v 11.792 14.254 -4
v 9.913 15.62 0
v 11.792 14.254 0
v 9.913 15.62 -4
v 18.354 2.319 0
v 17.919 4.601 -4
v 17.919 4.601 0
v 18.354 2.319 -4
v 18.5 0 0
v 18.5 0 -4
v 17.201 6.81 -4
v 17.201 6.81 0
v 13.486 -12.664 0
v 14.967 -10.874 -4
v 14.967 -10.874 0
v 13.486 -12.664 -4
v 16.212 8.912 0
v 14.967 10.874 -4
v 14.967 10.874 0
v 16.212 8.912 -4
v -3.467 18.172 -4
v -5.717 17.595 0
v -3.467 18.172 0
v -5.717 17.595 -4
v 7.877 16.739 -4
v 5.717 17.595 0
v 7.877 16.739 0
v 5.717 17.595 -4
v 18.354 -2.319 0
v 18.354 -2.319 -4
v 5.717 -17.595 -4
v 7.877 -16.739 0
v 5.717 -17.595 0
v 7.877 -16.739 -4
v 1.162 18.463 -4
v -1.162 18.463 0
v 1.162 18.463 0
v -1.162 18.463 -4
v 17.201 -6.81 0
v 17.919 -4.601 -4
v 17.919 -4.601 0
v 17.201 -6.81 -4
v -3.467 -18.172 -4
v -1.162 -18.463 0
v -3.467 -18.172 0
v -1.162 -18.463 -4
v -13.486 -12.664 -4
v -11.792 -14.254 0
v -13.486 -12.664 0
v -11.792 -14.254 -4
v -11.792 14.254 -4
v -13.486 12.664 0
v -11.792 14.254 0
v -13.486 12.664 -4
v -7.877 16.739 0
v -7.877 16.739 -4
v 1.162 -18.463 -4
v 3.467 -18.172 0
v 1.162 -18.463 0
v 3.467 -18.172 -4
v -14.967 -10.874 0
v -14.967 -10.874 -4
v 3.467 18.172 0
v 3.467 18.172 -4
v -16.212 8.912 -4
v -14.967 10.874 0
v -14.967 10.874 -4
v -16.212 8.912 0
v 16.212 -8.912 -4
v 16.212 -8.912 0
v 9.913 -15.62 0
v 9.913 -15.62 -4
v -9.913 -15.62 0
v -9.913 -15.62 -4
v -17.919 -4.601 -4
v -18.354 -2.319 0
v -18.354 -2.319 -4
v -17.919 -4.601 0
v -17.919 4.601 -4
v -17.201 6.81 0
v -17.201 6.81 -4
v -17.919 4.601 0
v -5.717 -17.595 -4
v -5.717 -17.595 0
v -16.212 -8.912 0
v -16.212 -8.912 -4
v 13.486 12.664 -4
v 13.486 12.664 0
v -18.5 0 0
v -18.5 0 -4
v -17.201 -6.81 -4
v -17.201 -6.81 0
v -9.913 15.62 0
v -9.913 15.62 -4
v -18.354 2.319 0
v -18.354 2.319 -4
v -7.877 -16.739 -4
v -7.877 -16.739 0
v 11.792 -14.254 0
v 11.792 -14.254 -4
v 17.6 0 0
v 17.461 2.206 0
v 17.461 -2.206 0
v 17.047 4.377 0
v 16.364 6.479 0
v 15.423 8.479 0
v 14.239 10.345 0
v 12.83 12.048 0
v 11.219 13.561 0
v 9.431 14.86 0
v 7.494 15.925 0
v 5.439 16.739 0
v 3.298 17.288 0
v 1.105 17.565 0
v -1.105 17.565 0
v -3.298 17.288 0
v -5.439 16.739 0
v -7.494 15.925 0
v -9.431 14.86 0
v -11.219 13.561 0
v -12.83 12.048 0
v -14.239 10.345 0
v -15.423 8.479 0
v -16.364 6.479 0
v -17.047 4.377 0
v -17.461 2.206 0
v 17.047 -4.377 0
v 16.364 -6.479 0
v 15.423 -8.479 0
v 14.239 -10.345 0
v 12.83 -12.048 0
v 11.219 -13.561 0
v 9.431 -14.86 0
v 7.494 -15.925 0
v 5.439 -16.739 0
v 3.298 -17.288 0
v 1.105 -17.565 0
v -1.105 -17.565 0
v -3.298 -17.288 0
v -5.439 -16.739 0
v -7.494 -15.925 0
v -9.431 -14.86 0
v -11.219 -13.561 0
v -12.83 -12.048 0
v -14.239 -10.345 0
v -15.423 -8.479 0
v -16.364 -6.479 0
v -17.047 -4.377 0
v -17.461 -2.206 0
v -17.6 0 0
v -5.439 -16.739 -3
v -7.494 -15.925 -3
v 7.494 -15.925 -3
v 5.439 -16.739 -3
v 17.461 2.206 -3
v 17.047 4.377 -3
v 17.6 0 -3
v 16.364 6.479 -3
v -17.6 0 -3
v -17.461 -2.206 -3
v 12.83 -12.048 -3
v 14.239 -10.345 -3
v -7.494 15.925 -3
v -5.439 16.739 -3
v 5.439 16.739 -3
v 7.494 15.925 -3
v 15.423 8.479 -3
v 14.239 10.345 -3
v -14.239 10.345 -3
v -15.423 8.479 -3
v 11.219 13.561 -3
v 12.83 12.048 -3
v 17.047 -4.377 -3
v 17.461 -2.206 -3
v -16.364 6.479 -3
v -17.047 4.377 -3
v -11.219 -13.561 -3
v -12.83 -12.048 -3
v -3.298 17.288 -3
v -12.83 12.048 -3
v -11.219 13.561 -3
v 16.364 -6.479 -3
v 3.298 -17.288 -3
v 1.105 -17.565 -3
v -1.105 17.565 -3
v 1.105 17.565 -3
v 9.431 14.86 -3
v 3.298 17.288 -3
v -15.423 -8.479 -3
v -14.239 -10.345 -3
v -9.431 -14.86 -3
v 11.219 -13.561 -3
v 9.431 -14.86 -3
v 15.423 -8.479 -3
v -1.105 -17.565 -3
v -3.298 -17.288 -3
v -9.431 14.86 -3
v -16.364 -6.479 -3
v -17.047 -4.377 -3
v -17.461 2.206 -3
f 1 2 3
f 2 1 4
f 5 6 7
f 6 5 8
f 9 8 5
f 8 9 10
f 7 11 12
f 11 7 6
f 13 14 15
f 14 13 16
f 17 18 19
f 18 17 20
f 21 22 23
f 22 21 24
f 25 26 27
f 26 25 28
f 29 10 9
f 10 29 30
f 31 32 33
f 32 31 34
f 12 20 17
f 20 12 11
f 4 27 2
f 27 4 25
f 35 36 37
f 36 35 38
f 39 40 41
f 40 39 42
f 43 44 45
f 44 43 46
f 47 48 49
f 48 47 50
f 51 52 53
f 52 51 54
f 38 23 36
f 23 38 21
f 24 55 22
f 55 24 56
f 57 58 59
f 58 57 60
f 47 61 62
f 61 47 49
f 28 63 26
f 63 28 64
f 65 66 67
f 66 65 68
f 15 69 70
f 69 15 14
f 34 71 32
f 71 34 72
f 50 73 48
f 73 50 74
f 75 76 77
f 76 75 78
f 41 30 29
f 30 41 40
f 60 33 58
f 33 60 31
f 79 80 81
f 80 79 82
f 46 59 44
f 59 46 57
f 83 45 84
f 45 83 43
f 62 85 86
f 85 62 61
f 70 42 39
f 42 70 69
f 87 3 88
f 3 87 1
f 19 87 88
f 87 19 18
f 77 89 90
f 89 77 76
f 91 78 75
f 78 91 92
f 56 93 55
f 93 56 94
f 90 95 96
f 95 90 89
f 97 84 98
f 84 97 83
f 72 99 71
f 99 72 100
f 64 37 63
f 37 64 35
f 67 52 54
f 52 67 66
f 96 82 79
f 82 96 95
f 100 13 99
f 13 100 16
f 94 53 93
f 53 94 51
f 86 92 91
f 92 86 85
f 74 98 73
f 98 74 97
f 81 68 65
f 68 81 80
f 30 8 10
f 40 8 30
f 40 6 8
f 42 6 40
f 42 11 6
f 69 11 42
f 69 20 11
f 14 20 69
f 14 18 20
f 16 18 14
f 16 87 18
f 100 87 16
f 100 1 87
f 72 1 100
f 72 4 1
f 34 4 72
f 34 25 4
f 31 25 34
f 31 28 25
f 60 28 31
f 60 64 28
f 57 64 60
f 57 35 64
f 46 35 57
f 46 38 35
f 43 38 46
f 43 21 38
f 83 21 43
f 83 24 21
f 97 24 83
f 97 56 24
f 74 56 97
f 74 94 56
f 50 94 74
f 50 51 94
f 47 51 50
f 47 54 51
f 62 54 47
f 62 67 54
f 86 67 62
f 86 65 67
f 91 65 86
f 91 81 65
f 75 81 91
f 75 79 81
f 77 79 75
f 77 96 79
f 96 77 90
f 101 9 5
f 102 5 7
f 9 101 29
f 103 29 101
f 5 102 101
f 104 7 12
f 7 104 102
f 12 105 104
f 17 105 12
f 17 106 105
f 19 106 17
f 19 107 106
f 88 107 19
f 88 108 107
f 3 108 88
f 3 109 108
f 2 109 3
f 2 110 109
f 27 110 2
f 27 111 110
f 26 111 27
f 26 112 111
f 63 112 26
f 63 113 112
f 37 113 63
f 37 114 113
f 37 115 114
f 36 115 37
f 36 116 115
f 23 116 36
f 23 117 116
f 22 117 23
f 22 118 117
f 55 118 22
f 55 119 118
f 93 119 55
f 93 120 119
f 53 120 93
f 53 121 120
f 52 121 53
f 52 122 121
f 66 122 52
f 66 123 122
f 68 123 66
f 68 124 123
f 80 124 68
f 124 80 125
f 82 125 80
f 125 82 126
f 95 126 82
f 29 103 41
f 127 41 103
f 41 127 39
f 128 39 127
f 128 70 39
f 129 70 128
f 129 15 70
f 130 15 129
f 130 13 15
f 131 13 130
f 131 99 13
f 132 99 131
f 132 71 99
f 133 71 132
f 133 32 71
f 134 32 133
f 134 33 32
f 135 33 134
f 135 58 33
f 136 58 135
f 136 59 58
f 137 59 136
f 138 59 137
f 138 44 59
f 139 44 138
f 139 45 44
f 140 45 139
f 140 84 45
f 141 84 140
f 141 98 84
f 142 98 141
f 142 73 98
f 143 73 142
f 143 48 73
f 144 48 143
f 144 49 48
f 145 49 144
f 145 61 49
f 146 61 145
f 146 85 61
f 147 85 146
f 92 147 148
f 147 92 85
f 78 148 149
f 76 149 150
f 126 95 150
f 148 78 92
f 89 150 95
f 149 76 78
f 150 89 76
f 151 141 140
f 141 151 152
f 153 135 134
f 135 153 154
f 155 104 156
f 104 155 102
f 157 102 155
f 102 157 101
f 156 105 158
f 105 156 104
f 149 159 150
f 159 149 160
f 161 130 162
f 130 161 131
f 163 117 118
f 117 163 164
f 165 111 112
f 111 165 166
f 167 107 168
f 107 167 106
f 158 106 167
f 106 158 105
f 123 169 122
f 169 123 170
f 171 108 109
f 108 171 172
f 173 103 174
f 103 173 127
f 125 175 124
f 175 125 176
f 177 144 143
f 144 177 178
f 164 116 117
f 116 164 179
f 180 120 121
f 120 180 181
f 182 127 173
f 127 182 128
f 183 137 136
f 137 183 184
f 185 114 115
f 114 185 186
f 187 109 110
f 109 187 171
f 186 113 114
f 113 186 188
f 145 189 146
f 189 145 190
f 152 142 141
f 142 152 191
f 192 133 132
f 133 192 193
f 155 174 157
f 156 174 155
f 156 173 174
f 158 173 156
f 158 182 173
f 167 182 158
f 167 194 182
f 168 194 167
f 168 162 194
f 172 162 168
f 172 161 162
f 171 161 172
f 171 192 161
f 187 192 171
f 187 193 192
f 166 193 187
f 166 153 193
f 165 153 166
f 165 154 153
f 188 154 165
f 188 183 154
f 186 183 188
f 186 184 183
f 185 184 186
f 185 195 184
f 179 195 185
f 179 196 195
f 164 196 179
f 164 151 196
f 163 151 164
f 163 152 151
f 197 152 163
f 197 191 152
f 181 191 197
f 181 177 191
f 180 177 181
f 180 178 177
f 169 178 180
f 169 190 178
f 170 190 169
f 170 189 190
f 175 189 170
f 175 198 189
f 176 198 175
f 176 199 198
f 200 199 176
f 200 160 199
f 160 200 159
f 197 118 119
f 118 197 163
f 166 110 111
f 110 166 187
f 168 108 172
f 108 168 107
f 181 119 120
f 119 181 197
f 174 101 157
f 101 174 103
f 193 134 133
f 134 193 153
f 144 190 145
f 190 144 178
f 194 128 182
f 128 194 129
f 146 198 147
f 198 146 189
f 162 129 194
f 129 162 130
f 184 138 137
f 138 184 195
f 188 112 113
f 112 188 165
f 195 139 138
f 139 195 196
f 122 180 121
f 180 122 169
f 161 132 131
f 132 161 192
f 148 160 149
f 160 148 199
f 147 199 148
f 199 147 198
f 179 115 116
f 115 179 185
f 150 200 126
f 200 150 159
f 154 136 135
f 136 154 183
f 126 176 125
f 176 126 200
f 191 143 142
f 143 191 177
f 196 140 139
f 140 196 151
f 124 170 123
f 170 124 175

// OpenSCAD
$fn = 50;


difference() {
	union() {
		translate(v = [0, 0, -4.0000000000]) {
			cylinder(h = 4, r = 18.5000000000);
		}
	}
	union() {
		#translate(v = [0, 0, -3.0000000000]) {
			cylinder(h = 3, r = 17.6000000000);
		}
	}
}
